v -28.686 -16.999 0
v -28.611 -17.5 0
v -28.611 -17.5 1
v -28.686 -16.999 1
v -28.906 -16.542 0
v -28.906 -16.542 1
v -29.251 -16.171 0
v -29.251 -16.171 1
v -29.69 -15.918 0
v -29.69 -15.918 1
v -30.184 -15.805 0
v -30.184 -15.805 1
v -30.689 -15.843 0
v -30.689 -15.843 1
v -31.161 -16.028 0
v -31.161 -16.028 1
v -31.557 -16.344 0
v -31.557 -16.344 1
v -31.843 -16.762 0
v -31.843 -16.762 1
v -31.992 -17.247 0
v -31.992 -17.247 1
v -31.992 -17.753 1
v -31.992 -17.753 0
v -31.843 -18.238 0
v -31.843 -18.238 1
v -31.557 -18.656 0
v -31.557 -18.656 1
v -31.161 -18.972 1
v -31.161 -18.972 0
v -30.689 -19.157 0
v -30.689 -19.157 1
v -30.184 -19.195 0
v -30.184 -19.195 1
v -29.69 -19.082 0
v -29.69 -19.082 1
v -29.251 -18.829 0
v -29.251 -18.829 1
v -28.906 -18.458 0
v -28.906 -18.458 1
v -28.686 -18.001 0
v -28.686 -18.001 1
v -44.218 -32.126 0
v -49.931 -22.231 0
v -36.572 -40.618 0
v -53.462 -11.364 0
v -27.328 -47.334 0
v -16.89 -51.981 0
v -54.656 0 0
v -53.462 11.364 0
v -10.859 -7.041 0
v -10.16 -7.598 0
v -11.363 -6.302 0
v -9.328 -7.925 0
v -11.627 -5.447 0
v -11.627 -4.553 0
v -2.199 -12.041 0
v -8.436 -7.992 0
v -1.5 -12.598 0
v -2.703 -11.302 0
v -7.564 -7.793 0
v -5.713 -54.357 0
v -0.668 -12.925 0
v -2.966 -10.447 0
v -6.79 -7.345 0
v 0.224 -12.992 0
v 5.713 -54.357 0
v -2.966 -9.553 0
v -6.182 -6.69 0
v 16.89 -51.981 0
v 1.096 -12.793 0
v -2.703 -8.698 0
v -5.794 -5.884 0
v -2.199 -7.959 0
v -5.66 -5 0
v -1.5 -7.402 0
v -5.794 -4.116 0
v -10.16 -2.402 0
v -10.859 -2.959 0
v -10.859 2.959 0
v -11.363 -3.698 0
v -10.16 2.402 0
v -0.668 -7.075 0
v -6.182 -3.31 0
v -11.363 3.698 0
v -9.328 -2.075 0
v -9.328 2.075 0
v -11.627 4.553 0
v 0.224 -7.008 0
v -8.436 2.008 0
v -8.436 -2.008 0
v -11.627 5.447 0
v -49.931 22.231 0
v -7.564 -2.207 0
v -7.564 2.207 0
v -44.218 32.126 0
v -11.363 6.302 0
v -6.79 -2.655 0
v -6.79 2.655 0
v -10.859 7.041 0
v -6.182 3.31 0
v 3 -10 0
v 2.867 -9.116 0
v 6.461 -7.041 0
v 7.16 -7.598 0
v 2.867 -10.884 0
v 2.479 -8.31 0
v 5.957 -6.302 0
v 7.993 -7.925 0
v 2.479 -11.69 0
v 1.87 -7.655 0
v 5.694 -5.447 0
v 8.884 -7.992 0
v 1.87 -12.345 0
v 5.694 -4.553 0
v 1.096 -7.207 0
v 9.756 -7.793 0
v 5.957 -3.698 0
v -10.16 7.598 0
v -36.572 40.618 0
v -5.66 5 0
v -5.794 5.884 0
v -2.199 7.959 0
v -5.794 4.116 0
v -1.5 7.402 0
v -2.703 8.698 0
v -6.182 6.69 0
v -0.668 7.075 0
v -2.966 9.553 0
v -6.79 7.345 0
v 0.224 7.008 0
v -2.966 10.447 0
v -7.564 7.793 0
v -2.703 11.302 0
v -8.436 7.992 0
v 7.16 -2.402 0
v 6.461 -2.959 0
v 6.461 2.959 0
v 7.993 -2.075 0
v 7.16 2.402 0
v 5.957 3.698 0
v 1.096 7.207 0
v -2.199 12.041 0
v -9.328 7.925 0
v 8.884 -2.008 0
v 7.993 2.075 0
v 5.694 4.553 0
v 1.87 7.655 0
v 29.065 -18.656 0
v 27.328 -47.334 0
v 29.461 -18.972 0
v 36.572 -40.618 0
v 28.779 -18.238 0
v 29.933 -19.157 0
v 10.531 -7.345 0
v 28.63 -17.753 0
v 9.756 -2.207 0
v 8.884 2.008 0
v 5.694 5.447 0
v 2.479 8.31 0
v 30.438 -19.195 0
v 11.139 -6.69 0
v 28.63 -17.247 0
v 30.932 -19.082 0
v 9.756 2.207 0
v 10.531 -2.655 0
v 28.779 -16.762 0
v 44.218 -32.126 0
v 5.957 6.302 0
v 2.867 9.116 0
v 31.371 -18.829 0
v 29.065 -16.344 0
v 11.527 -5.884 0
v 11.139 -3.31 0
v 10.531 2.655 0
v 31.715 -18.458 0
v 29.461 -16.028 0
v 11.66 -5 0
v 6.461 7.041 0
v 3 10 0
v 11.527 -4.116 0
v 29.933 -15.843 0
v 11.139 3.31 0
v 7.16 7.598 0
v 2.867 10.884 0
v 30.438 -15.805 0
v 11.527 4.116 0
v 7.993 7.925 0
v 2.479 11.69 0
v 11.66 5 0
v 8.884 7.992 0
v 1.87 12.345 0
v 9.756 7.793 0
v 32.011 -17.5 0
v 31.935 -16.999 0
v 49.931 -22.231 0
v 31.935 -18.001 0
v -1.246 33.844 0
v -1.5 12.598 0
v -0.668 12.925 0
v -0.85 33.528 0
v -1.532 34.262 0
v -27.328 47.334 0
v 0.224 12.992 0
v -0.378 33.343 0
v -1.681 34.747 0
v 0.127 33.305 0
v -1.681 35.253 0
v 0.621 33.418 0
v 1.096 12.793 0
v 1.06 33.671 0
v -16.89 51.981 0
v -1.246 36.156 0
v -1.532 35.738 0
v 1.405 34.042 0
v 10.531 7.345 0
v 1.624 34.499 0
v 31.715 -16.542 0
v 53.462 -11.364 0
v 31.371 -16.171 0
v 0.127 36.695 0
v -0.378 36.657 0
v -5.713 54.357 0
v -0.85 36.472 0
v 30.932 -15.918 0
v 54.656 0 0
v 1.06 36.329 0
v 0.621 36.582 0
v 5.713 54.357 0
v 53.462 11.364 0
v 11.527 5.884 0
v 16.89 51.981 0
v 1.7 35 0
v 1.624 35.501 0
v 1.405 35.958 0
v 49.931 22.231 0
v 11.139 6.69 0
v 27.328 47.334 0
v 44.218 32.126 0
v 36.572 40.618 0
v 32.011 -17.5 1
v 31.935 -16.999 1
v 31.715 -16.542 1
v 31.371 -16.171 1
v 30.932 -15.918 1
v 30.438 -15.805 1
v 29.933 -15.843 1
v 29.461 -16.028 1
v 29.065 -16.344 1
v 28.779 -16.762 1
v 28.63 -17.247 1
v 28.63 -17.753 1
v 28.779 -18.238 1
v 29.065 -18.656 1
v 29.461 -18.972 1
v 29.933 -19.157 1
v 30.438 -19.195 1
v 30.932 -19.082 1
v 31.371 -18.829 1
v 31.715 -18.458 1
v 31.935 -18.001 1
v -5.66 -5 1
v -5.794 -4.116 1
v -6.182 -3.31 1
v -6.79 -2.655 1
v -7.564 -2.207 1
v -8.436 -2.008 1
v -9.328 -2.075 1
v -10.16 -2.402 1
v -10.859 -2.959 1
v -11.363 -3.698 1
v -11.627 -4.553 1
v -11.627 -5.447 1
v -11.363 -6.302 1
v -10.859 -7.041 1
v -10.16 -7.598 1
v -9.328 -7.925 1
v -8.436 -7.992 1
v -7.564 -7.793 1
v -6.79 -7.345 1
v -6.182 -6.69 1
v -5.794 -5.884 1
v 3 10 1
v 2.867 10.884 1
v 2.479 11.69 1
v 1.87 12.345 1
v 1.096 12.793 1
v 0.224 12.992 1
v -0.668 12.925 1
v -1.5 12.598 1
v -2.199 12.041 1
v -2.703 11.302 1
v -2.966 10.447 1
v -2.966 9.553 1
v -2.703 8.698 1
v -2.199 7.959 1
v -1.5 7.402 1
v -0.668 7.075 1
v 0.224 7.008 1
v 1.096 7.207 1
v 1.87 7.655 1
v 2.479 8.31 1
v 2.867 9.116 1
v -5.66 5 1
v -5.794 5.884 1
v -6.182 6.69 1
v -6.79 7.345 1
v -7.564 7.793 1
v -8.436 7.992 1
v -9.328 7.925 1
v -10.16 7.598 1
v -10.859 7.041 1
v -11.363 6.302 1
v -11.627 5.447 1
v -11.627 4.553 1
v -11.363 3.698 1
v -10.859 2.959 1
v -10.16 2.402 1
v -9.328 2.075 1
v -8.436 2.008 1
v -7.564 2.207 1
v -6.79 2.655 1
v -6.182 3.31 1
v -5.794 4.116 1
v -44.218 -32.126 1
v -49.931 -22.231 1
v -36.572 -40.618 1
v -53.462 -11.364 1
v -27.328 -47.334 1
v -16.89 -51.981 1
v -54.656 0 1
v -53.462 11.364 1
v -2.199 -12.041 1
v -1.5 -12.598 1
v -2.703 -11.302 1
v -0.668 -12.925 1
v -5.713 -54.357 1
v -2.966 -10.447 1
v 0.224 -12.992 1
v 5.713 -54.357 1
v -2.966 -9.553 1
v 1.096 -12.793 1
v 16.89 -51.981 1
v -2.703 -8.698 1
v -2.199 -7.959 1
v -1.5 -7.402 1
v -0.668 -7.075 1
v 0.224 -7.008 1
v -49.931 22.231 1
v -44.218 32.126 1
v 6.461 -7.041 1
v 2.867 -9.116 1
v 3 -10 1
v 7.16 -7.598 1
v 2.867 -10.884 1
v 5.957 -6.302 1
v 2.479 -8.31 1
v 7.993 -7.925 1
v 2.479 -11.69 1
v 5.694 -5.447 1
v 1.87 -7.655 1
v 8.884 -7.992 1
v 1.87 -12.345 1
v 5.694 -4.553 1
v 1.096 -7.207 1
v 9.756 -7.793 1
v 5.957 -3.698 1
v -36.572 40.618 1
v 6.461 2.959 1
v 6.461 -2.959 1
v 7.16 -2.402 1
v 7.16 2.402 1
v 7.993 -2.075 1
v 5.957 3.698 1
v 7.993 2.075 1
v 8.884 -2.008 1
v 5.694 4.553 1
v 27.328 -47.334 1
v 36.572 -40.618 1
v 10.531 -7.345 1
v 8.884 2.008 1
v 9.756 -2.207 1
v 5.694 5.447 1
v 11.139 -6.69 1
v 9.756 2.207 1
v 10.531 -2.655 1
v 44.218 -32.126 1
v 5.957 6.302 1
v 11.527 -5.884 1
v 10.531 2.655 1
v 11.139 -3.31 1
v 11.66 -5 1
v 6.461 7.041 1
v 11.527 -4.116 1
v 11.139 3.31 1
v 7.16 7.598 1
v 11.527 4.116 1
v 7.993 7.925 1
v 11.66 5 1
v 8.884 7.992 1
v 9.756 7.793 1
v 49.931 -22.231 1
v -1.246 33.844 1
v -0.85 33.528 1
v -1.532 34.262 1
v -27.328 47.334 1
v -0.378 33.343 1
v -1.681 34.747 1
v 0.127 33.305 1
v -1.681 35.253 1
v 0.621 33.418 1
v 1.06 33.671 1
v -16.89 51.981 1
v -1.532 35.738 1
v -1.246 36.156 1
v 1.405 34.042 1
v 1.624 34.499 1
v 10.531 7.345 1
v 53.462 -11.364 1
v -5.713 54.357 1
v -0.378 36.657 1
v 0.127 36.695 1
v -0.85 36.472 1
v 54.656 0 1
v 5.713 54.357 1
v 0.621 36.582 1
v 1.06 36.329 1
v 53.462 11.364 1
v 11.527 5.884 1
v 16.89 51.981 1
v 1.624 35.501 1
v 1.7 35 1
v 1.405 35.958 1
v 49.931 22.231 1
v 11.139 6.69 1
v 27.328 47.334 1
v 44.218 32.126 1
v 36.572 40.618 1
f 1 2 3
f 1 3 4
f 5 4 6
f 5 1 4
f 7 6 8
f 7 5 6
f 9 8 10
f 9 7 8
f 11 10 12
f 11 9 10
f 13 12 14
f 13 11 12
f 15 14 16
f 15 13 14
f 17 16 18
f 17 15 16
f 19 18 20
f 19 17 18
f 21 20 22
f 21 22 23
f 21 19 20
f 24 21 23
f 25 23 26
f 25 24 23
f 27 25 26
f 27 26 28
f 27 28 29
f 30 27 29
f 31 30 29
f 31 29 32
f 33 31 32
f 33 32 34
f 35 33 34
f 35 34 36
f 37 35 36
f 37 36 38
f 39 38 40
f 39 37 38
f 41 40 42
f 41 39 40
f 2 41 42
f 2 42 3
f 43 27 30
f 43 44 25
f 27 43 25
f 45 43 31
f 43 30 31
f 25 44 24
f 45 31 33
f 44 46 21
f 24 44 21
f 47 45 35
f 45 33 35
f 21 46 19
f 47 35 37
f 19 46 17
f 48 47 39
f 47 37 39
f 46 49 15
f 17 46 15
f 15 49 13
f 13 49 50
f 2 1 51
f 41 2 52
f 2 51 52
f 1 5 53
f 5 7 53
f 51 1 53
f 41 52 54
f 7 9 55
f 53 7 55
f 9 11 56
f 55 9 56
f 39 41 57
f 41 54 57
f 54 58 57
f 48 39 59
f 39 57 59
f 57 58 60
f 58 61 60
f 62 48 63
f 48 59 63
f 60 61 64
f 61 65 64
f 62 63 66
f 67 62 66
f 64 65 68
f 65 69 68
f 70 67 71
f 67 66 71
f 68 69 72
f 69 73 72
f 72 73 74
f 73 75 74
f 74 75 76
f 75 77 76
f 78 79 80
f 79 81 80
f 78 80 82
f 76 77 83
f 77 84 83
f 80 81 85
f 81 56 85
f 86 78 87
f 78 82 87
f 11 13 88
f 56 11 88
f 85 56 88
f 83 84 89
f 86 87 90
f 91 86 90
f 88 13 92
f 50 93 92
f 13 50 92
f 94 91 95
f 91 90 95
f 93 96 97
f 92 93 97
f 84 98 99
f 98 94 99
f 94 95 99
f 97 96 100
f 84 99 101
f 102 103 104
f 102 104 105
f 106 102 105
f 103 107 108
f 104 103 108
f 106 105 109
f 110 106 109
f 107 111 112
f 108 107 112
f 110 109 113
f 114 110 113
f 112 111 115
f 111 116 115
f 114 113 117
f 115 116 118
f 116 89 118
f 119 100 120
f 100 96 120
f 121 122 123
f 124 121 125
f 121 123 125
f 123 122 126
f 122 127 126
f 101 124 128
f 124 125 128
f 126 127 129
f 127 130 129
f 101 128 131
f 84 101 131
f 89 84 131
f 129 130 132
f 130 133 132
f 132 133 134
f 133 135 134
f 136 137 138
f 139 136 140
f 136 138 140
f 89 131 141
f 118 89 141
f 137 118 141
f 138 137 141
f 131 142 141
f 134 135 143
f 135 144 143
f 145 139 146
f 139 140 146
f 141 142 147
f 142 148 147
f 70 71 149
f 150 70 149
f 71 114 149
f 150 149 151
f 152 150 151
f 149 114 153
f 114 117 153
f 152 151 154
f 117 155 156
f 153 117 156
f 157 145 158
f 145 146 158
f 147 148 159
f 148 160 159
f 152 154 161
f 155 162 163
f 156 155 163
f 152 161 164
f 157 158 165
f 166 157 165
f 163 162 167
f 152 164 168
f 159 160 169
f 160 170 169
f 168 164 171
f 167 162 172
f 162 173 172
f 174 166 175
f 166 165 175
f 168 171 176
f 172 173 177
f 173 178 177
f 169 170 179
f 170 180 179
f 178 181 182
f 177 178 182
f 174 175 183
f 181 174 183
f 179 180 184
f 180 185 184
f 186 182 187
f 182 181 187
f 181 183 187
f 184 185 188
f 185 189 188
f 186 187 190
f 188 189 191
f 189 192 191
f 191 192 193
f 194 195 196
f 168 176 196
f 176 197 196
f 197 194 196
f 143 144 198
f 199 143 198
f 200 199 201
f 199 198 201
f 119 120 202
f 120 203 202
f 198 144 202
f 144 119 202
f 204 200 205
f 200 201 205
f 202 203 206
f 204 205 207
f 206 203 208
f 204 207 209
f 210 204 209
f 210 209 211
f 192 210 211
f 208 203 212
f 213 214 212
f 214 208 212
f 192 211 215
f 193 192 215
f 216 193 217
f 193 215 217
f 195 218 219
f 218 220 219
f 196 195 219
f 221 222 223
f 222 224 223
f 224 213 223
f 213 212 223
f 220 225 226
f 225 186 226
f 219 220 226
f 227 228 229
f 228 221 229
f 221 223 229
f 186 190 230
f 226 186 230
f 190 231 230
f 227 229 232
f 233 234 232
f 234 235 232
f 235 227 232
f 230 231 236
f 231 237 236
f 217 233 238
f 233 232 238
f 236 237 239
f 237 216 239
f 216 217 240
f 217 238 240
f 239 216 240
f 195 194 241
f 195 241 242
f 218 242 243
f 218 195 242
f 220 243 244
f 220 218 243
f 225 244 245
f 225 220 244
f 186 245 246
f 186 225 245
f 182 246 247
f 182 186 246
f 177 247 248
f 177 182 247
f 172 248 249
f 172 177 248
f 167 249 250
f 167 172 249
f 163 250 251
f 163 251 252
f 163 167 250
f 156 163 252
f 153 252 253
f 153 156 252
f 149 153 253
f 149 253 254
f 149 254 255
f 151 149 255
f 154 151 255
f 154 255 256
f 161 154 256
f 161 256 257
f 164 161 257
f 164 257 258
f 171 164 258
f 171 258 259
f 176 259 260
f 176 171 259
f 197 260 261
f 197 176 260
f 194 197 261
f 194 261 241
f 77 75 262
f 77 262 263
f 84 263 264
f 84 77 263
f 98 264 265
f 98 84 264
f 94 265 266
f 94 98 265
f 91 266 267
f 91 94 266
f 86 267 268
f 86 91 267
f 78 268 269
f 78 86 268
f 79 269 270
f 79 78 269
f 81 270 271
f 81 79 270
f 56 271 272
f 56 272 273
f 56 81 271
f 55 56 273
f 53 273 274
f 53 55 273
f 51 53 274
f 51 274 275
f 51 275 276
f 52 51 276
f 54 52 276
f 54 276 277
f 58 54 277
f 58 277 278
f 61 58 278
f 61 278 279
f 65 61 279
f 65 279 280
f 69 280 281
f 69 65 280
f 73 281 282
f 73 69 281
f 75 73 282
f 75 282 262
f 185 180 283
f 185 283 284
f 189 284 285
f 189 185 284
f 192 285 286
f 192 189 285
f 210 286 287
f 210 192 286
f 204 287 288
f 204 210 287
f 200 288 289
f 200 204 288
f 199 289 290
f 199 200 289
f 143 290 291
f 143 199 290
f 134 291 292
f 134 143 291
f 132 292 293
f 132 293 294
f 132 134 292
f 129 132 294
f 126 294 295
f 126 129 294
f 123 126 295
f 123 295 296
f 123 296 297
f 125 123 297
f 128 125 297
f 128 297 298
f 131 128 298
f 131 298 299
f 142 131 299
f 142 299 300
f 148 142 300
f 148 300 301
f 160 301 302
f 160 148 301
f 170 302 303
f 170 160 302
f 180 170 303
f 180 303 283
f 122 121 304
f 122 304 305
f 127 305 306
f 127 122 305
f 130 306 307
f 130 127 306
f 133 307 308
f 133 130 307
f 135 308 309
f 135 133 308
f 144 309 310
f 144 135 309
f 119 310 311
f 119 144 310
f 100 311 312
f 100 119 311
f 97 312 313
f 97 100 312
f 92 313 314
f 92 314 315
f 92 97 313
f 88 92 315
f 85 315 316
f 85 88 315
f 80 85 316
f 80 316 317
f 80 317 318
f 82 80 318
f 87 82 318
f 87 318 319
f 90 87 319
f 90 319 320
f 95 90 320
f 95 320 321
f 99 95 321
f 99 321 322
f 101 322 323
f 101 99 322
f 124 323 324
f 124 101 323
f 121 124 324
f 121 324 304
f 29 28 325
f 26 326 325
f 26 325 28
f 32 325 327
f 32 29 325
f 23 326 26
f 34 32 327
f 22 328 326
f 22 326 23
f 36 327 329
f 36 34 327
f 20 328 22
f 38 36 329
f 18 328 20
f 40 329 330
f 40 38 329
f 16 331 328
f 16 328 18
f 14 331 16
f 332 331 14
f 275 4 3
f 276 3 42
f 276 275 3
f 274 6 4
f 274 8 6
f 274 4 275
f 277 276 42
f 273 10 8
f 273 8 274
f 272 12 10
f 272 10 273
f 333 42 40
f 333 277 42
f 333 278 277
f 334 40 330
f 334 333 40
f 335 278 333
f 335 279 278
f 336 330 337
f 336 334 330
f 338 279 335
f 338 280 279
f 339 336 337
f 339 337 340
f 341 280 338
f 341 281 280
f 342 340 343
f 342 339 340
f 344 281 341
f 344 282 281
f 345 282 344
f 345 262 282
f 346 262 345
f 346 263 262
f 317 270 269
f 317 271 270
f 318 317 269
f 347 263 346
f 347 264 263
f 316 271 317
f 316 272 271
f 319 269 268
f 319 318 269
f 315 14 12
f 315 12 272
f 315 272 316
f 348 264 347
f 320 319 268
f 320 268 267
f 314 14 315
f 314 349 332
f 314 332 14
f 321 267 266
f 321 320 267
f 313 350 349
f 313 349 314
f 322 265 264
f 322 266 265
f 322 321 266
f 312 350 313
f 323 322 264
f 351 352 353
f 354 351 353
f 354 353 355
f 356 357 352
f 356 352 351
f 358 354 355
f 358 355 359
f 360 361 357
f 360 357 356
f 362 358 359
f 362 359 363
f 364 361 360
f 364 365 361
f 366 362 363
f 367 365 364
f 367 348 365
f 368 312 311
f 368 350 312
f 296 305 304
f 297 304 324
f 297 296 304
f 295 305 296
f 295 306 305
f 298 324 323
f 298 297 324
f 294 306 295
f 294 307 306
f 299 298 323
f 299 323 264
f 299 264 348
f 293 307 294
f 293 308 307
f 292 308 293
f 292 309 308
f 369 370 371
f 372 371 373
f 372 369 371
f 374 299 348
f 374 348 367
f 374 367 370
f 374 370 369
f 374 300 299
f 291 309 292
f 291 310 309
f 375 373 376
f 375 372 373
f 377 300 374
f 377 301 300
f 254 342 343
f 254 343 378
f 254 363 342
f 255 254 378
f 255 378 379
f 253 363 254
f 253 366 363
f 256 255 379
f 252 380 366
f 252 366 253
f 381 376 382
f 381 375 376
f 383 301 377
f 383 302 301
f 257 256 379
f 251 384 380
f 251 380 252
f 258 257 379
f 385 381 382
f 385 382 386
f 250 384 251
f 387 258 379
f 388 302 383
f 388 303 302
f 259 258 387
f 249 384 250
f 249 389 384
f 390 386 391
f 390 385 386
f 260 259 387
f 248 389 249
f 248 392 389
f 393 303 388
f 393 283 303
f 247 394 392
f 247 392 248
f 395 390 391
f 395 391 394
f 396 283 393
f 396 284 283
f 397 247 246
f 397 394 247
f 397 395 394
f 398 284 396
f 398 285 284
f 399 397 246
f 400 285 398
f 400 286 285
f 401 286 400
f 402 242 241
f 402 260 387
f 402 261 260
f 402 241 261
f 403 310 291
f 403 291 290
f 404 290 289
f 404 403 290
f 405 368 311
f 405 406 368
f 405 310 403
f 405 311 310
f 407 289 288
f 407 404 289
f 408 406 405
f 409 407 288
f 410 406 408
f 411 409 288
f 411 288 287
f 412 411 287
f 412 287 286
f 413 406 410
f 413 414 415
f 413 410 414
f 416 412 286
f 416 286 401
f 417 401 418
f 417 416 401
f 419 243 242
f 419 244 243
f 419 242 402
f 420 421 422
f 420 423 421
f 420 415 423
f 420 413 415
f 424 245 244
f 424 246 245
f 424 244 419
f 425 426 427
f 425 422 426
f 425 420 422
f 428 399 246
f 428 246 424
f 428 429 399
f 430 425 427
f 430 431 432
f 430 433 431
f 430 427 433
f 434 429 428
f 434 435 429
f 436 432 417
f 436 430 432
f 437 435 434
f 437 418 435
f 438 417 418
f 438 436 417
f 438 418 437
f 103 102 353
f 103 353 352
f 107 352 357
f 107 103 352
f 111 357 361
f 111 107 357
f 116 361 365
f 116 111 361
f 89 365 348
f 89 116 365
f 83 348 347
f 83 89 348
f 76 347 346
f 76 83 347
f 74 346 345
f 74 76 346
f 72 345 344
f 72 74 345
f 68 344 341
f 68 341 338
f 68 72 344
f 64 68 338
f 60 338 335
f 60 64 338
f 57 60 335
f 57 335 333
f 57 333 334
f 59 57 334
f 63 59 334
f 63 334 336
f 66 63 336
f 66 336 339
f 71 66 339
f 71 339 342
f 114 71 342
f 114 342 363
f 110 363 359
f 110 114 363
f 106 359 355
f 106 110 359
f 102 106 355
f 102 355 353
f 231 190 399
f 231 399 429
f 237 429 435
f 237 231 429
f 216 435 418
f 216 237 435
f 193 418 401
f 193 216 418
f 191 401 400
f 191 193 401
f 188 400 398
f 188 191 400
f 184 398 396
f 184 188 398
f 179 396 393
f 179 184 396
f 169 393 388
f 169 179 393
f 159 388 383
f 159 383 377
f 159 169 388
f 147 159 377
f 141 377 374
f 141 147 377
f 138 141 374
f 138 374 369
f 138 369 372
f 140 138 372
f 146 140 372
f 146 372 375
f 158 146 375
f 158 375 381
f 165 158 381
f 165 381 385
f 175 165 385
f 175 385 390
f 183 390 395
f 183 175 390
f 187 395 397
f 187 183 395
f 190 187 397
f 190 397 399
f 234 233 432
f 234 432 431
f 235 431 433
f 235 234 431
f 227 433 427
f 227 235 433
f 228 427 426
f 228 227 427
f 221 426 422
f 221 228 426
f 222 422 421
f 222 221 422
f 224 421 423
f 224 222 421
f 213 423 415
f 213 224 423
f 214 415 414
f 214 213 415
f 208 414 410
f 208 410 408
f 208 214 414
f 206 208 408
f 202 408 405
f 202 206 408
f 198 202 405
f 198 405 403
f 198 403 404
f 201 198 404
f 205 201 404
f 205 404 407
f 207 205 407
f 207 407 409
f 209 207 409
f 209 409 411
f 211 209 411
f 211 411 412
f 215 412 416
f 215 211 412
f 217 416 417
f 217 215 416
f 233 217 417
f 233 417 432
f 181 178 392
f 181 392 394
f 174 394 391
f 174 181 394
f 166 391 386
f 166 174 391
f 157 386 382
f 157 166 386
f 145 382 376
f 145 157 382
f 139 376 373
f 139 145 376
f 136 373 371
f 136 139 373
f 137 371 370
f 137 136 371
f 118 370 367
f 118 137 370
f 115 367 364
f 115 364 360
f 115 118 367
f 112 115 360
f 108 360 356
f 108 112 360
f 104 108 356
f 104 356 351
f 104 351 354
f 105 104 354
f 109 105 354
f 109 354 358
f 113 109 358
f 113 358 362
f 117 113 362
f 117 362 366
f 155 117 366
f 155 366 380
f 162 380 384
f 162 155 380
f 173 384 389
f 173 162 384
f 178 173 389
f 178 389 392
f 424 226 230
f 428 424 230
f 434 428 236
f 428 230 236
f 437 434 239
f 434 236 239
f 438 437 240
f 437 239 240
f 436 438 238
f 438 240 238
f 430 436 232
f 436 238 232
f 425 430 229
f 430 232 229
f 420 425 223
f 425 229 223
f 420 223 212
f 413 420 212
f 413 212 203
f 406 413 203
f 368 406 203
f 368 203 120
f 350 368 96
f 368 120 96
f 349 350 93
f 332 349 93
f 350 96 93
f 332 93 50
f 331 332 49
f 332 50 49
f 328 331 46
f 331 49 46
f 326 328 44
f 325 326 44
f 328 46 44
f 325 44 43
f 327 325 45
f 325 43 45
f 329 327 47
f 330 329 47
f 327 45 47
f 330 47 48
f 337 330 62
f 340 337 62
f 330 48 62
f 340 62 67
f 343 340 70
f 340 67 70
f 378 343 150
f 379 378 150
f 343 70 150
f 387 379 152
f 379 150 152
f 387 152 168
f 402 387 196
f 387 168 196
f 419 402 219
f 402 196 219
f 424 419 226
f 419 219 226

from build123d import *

# Parameters (mm, degrees)
SKETCH1_R           = 54.656342245
SKETCH1_R_2         = 1.7
SKETCH1_R_3         = 3
BOSS_EXTRUDE1_DEPTH = 1


with BuildPart() as part:
    # Sketch1 → Boss-Extrude1 (new body)
    with BuildSketch(Plane.XY):
        Circle(SKETCH1_R)
        with Locations((0, 35)):
            Circle(SKETCH1_R_2, mode=Mode.SUBTRACT)
        with Locations((30.310889132, -17.5)):
            Circle(SKETCH1_R_2, mode=Mode.SUBTRACT)
        with Locations((-30.310889132, -17.5)):
            Circle(SKETCH1_R_2, mode=Mode.SUBTRACT)
        with Locations((0, 10)):
            Circle(SKETCH1_R_3, mode=Mode.SUBTRACT)
        with Locations((8.660254038, 5)):
            Circle(SKETCH1_R_3, mode=Mode.SUBTRACT)
        with Locations((8.660254038, -5)):
            Circle(SKETCH1_R_3, mode=Mode.SUBTRACT)
        with Locations((0, -10)):
            Circle(SKETCH1_R_3, mode=Mode.SUBTRACT)
        with Locations((-8.660254038, -5)):
            Circle(SKETCH1_R_3, mode=Mode.SUBTRACT)
        with Locations((-8.660254038, 5)):
            Circle(SKETCH1_R_3, mode=Mode.SUBTRACT)
    extrude(amount=BOSS_EXTRUDE1_DEPTH)


solid = part.part
